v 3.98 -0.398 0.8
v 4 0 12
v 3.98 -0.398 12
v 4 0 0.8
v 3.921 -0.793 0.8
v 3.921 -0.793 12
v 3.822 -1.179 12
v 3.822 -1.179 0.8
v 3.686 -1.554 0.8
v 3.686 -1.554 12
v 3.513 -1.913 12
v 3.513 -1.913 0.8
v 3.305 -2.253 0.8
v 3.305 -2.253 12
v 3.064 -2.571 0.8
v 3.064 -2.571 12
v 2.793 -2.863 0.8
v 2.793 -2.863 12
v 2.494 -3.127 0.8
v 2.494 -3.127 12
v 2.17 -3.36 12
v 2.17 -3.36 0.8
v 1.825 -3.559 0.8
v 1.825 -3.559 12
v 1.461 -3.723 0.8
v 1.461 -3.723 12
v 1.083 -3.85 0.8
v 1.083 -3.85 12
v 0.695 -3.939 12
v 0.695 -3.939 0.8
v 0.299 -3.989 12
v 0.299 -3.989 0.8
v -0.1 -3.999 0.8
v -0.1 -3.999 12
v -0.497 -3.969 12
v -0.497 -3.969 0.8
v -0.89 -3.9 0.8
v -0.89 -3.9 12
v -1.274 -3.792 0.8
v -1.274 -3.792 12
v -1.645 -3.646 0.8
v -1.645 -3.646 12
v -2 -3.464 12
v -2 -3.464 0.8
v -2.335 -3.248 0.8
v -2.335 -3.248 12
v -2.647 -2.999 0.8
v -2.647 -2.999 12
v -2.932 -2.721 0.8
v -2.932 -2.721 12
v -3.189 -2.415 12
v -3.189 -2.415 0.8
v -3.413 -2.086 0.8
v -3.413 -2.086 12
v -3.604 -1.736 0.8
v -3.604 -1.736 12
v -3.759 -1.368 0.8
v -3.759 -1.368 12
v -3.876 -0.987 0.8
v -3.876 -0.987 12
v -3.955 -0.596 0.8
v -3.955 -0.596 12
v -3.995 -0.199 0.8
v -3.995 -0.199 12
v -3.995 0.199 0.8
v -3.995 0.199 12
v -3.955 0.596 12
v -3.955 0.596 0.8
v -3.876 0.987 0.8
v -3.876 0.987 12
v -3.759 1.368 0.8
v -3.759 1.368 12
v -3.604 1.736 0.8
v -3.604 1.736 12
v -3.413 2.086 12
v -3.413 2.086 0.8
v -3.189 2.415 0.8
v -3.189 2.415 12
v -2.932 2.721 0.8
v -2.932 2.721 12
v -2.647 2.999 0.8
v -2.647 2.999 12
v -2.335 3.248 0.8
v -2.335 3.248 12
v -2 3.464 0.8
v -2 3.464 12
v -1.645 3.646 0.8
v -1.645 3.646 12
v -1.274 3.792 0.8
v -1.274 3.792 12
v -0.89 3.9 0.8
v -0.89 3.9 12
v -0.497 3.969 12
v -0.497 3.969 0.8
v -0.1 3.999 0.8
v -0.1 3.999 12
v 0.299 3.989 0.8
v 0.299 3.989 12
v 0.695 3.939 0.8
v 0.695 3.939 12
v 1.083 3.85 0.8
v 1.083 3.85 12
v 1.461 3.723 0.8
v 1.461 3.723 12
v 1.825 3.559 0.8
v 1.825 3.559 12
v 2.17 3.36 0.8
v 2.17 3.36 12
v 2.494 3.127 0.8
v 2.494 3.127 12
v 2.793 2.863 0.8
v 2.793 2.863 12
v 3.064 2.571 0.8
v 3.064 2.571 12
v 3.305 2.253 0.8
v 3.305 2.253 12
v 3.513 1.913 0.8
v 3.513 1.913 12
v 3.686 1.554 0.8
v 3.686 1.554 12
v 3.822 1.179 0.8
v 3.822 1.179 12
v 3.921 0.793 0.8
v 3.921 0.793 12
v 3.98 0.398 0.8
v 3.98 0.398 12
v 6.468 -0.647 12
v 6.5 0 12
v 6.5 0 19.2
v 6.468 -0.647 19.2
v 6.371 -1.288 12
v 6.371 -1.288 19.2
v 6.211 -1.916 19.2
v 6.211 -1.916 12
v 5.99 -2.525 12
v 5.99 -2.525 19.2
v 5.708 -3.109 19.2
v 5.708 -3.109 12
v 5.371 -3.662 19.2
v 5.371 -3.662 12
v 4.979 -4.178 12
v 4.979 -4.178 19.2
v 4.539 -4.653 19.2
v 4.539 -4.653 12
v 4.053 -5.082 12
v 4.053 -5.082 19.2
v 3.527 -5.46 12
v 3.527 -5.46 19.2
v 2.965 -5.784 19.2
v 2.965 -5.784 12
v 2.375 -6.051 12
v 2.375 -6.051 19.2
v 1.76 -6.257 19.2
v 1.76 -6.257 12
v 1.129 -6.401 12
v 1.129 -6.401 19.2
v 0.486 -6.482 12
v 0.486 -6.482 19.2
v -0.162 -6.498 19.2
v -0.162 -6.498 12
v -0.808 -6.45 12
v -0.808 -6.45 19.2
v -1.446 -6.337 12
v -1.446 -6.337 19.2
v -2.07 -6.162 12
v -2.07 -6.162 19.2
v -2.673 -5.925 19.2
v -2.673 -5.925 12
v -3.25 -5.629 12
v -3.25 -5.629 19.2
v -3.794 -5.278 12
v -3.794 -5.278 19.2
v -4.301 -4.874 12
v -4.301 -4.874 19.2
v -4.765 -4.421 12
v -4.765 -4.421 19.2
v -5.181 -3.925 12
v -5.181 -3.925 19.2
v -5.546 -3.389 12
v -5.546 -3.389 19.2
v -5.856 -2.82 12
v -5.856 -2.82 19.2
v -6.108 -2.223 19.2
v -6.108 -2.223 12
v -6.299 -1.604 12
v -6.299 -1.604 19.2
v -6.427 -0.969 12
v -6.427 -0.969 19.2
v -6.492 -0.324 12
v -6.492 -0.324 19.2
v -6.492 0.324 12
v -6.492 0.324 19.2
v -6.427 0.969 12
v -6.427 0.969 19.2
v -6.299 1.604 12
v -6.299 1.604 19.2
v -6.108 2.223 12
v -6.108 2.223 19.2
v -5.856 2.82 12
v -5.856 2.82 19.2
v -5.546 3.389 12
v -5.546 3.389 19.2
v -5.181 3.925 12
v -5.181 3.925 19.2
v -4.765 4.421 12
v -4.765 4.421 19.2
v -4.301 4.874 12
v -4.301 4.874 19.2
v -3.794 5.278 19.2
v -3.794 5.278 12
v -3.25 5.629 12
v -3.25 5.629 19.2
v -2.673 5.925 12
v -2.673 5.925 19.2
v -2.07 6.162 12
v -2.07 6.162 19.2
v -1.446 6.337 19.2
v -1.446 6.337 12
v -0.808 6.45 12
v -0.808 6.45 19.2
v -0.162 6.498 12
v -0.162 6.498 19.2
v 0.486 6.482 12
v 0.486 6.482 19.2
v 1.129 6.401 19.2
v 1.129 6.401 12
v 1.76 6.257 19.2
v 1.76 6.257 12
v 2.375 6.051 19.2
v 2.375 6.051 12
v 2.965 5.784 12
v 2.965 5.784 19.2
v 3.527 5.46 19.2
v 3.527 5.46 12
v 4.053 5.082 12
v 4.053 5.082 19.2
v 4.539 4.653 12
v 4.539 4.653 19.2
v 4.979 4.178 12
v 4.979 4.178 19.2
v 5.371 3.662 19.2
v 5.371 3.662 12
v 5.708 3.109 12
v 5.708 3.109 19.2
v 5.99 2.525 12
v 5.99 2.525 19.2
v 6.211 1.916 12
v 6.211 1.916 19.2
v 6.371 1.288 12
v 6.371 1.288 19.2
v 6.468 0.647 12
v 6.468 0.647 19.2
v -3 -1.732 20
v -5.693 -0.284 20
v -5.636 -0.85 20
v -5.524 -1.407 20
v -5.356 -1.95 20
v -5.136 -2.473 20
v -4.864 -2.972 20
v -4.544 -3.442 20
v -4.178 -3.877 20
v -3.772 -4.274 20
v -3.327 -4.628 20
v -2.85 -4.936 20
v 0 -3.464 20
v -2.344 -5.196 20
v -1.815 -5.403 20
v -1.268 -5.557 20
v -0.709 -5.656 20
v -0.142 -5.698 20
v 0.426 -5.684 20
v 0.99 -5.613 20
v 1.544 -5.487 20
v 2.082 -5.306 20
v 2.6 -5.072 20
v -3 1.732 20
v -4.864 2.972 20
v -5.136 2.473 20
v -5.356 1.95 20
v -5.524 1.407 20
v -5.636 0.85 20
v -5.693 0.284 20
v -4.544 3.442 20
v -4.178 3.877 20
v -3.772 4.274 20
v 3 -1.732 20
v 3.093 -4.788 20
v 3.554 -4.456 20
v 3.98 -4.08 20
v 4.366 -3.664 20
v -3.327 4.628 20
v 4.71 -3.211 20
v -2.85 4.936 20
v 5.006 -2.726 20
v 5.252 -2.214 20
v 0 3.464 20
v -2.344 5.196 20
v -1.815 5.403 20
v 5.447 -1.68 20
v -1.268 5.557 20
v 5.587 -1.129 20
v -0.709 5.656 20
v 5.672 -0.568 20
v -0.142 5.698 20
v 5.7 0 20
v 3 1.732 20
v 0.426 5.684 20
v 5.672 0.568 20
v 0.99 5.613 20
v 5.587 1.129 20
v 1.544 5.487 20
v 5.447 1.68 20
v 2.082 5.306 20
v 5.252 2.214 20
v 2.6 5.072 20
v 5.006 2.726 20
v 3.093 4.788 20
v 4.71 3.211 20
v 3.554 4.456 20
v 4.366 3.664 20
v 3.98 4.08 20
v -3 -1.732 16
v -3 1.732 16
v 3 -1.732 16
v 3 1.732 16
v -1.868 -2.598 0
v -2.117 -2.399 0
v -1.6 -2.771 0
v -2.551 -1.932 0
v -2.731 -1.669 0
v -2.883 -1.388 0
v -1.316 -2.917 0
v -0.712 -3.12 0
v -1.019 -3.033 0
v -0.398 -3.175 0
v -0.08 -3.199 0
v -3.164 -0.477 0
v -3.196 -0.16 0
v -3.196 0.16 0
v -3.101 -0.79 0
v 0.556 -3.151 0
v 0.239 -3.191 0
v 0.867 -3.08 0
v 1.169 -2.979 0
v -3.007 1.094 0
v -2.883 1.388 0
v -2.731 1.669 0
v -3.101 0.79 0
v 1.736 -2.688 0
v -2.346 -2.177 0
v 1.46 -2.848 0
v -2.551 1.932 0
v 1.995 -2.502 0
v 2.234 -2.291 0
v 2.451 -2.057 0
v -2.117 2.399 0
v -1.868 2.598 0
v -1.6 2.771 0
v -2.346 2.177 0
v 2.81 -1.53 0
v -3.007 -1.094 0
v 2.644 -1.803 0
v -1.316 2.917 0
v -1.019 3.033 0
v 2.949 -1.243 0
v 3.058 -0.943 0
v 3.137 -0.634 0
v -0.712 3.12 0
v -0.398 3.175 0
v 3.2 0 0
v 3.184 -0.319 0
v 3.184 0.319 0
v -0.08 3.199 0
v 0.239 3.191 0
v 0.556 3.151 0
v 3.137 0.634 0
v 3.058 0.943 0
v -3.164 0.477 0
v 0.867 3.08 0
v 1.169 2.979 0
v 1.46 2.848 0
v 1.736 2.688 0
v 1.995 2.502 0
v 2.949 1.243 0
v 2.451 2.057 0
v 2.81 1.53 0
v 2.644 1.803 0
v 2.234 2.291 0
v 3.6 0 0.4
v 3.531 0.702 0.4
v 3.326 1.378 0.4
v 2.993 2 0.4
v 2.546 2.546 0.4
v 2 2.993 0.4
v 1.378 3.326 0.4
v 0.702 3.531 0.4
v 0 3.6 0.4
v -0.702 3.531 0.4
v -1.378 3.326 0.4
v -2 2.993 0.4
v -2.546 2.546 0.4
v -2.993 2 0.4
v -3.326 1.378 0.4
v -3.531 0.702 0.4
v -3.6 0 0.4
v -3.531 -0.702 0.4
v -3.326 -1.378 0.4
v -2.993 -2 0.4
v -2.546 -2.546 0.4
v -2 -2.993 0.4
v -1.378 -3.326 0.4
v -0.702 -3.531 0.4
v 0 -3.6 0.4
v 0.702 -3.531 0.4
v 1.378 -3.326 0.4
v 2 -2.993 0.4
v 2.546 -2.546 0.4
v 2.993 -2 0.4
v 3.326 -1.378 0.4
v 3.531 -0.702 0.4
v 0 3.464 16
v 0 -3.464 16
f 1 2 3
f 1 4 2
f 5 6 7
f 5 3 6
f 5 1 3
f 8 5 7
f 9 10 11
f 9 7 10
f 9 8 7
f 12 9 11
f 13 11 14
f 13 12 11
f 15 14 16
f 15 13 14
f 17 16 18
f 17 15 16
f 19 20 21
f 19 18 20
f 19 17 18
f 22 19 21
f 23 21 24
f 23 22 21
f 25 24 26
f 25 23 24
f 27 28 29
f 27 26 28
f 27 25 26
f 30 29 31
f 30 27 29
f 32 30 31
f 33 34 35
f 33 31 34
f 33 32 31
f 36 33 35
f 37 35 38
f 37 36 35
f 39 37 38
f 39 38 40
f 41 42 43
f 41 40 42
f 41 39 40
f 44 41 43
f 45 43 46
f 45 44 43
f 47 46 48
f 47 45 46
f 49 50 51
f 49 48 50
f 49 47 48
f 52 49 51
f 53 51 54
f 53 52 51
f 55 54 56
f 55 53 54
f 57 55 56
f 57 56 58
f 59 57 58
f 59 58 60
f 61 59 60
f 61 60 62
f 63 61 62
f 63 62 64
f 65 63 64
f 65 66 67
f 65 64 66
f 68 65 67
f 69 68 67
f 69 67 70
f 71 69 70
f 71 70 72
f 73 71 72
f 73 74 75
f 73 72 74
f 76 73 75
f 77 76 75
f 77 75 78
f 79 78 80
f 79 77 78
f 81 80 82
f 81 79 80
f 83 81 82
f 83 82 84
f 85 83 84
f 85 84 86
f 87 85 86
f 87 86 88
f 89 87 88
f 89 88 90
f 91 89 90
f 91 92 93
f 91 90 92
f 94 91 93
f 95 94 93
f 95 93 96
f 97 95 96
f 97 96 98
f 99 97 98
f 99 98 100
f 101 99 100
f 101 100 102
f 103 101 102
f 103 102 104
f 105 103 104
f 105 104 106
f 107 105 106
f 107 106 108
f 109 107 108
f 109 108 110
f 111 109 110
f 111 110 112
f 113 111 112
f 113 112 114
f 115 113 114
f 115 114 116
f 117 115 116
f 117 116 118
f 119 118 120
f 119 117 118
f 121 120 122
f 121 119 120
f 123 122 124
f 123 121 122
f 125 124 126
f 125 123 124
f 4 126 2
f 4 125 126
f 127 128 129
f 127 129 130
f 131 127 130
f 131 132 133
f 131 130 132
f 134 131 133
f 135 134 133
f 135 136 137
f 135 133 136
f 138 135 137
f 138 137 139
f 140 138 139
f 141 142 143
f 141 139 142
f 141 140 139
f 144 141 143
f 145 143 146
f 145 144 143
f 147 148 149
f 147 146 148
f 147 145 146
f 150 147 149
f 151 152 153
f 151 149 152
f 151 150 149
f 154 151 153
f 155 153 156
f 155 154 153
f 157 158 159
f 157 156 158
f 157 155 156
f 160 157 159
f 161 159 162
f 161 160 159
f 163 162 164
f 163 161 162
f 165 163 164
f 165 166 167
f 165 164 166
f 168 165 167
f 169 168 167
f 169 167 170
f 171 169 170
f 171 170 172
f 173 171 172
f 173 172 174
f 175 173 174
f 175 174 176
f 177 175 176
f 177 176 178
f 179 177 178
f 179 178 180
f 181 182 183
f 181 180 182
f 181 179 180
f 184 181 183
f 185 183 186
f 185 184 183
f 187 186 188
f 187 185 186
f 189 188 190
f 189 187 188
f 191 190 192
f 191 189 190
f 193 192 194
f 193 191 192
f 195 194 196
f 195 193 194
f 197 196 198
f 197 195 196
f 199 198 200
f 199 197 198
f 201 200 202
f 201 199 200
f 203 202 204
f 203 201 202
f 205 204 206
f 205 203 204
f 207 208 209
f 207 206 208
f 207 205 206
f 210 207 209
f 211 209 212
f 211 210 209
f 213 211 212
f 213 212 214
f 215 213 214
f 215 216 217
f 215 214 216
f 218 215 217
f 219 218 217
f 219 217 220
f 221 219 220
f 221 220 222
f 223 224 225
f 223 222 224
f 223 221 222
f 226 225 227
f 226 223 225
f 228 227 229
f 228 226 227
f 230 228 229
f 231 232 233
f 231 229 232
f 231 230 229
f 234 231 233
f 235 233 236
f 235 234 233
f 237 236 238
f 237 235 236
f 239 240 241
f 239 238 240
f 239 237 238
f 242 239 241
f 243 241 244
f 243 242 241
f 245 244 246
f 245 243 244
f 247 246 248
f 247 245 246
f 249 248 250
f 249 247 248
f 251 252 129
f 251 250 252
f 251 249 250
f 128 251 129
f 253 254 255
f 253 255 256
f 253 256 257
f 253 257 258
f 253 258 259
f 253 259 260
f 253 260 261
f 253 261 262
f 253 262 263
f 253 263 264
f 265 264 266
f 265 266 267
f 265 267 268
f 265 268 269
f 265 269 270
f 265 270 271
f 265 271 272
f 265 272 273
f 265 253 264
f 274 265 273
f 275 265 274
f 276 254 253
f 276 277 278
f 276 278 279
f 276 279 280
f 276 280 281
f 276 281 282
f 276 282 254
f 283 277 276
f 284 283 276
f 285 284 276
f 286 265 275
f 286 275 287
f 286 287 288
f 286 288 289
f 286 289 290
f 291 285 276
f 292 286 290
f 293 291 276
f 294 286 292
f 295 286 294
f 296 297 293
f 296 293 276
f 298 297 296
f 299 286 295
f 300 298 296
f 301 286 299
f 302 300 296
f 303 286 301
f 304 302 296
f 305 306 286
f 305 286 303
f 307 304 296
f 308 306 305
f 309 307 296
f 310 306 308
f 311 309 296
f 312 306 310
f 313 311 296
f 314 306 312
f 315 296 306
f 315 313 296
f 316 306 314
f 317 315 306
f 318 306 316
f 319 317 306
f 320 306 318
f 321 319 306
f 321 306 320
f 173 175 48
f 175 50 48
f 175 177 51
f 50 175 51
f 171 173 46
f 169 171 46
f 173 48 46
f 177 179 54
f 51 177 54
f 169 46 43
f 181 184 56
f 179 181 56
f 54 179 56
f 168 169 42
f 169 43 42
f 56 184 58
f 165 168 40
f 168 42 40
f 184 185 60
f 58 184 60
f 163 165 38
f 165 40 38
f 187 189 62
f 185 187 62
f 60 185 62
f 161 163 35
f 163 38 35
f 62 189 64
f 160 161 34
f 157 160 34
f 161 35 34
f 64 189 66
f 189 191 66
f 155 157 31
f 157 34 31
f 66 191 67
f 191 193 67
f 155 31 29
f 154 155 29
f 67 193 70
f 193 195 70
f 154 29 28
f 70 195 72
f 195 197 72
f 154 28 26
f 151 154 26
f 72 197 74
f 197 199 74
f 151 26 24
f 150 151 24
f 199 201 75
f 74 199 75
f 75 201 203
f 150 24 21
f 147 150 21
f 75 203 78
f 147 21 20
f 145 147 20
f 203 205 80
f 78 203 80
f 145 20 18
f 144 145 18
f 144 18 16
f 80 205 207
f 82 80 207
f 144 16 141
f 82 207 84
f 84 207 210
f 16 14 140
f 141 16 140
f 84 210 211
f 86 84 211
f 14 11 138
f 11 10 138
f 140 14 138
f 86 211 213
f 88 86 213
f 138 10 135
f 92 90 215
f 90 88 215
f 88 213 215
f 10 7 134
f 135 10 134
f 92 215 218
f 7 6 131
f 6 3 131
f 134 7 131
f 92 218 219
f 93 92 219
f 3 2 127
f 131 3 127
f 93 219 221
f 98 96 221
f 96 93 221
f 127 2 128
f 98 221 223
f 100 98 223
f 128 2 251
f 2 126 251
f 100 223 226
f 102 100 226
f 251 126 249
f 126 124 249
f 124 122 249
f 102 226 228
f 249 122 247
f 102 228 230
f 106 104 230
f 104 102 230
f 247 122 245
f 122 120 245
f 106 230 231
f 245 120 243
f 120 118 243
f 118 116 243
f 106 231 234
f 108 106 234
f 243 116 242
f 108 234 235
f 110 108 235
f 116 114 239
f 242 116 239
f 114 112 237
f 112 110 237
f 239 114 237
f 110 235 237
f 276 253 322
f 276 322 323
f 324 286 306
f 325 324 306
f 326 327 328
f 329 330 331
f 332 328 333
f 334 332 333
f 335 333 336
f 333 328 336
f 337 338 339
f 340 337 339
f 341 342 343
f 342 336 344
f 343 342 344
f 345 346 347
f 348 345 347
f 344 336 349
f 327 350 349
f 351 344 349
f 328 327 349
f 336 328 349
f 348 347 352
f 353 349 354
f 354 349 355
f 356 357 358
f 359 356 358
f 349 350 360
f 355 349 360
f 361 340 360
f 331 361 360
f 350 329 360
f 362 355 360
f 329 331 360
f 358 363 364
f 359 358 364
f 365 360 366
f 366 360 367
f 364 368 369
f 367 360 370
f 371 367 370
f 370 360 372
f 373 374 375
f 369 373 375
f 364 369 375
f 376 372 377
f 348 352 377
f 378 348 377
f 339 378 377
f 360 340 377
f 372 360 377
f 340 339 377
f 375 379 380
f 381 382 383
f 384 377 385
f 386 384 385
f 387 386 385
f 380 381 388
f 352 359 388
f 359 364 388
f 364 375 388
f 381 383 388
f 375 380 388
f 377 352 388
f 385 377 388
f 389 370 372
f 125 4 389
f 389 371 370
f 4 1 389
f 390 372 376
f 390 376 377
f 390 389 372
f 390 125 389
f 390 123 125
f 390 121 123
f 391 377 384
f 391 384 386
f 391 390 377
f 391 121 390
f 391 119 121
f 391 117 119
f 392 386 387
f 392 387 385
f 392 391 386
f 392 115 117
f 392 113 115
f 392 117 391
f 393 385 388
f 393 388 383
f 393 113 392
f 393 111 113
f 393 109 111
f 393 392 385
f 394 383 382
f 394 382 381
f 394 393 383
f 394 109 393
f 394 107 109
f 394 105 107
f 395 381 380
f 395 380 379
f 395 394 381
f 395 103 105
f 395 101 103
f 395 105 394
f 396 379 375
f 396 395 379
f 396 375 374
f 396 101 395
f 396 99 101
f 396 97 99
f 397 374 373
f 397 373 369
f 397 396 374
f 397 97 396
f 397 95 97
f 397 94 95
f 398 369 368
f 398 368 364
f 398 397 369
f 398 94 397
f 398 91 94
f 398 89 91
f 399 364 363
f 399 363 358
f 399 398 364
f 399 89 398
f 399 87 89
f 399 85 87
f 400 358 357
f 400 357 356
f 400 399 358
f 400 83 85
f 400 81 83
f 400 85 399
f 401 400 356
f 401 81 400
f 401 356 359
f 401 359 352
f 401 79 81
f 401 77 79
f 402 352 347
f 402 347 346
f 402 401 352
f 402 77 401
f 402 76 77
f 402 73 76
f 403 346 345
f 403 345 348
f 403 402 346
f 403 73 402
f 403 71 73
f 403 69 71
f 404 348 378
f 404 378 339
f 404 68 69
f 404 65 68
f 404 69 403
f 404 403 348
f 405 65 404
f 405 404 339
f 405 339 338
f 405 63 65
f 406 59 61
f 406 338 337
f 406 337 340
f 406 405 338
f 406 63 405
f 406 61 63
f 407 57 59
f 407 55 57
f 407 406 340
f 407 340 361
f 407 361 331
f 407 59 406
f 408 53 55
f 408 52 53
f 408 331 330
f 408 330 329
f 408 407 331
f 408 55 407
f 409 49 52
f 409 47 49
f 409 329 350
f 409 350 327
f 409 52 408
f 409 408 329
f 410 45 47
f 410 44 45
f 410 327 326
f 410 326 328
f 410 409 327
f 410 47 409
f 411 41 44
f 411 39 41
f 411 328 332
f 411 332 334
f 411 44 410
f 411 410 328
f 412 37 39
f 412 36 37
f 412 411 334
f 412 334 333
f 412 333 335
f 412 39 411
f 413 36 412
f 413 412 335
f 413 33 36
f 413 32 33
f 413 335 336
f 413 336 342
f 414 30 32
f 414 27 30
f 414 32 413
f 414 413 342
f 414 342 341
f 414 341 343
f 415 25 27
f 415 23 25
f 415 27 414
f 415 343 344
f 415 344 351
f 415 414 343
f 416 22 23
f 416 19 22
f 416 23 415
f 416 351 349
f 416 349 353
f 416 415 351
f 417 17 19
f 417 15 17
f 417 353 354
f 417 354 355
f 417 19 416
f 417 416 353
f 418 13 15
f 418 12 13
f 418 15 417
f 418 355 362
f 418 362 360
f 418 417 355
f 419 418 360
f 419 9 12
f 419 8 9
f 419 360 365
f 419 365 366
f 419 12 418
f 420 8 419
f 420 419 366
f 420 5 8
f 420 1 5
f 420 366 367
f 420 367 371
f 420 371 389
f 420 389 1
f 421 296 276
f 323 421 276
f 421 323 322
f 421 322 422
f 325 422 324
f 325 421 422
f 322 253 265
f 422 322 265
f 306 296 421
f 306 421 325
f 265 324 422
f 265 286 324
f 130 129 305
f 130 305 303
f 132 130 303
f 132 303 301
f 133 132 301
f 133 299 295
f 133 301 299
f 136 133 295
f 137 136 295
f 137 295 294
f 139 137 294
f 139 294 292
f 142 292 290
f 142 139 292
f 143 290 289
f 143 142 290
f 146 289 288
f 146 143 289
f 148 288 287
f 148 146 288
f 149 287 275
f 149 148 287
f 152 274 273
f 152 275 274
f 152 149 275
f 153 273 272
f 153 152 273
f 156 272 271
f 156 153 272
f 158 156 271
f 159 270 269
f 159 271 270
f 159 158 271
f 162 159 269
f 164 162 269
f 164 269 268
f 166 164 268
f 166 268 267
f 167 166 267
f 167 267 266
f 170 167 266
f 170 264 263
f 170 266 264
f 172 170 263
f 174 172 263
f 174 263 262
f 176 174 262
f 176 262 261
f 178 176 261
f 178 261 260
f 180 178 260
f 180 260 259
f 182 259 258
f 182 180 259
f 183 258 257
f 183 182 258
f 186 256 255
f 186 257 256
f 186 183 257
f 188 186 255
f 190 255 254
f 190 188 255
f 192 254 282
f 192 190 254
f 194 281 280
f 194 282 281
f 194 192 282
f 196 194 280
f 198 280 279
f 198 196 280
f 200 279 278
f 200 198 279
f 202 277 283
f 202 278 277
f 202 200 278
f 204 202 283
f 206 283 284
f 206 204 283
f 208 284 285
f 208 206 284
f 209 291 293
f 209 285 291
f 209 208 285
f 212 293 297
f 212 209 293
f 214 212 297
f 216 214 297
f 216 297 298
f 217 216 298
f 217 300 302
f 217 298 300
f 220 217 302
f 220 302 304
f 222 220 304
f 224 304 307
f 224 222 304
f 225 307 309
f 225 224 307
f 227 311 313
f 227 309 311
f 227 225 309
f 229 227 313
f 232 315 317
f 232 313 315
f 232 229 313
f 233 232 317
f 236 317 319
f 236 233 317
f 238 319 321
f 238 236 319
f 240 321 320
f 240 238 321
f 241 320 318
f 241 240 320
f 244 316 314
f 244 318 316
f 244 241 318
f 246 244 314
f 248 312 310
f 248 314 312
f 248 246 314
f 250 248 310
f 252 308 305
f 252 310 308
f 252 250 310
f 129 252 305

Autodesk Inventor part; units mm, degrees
ref_plane "YZ Plane" through (0, 0, 0) normal (1, 0, 0) x (0, 1, 0)
ref_plane "XZ Plane" through (0, 0, 0) normal (0, 1, 0) x (-1, 0, 0)
ref_plane "XY Plane" through (0, 0, 0) normal (0, 0, 1) x (1, 0, 0)
sketch "Sketch1" plane through (0, 0, 0) normal (0, 0, 1) x (1, 0, 0)
  circle A0 centre (0, 0) radius 4
  dimension "Diameter" = 8
extrude "Extrusion1" add sketch "Sketch1" along normal blind 12
sketch "Sketch2" plane through (0, 0, 12) normal (0, 0, 1) x (1, 0, 0)
  circle A0 centre (0, 0) radius 4 projected
  circle A1 centre (0, 0) radius 6.5
  dimension "Head_Diameter" = 13
extrude "Extrusion2" add sketch "Sketch2" along normal blind 8 contours A0 | A1
sketch "Sketch3" plane through (0, 0, 20) normal (0, 0, 1) x (1, 0, 0)
  circle A0 centre (0, 0) radius 6.5 projected
  circle A1 centre (0, 0) radius 3.4641 construction
  line L0 (0, 3.4641) -> (3, 1.7321)
  line L1 (3, -1.7321) -> (3, 1.7321)
  line L2 (0, 3.4641) -> (-3, 1.7321)
  line L3 (-3, -1.7321) -> (-3, 1.7321)
  line L4 (-3, -1.7321) -> (0, -3.4641)
  line L5 (3, -1.7321) -> (0, -3.4641)
  dimension "Hex_Width" = 6
extrude "Extrusion3" cut sketch "Sketch3" against normal blind 4 contours L0 L1 L5 L4 L3 L2
thread "Thread1" size "M8x1.25" class "4g6g" standard "ANSI Metric M Profile" length 12
chamfer "Chamfer1" distance 0.8 angle 45 2 edges at (-6.5, 0, 20) (-4, 0, 0)
equation "\"d9\" = ThreadLength"
equation "\"d12\" = Chamfer"
equation "\"ThreadLength\" = 12"
equation "\"Chamfer\" = 0.8"
properties part number "SCREW, SOCKET HD, P, 12.9, M8X1.25X12MM" material "Steel, MS"
